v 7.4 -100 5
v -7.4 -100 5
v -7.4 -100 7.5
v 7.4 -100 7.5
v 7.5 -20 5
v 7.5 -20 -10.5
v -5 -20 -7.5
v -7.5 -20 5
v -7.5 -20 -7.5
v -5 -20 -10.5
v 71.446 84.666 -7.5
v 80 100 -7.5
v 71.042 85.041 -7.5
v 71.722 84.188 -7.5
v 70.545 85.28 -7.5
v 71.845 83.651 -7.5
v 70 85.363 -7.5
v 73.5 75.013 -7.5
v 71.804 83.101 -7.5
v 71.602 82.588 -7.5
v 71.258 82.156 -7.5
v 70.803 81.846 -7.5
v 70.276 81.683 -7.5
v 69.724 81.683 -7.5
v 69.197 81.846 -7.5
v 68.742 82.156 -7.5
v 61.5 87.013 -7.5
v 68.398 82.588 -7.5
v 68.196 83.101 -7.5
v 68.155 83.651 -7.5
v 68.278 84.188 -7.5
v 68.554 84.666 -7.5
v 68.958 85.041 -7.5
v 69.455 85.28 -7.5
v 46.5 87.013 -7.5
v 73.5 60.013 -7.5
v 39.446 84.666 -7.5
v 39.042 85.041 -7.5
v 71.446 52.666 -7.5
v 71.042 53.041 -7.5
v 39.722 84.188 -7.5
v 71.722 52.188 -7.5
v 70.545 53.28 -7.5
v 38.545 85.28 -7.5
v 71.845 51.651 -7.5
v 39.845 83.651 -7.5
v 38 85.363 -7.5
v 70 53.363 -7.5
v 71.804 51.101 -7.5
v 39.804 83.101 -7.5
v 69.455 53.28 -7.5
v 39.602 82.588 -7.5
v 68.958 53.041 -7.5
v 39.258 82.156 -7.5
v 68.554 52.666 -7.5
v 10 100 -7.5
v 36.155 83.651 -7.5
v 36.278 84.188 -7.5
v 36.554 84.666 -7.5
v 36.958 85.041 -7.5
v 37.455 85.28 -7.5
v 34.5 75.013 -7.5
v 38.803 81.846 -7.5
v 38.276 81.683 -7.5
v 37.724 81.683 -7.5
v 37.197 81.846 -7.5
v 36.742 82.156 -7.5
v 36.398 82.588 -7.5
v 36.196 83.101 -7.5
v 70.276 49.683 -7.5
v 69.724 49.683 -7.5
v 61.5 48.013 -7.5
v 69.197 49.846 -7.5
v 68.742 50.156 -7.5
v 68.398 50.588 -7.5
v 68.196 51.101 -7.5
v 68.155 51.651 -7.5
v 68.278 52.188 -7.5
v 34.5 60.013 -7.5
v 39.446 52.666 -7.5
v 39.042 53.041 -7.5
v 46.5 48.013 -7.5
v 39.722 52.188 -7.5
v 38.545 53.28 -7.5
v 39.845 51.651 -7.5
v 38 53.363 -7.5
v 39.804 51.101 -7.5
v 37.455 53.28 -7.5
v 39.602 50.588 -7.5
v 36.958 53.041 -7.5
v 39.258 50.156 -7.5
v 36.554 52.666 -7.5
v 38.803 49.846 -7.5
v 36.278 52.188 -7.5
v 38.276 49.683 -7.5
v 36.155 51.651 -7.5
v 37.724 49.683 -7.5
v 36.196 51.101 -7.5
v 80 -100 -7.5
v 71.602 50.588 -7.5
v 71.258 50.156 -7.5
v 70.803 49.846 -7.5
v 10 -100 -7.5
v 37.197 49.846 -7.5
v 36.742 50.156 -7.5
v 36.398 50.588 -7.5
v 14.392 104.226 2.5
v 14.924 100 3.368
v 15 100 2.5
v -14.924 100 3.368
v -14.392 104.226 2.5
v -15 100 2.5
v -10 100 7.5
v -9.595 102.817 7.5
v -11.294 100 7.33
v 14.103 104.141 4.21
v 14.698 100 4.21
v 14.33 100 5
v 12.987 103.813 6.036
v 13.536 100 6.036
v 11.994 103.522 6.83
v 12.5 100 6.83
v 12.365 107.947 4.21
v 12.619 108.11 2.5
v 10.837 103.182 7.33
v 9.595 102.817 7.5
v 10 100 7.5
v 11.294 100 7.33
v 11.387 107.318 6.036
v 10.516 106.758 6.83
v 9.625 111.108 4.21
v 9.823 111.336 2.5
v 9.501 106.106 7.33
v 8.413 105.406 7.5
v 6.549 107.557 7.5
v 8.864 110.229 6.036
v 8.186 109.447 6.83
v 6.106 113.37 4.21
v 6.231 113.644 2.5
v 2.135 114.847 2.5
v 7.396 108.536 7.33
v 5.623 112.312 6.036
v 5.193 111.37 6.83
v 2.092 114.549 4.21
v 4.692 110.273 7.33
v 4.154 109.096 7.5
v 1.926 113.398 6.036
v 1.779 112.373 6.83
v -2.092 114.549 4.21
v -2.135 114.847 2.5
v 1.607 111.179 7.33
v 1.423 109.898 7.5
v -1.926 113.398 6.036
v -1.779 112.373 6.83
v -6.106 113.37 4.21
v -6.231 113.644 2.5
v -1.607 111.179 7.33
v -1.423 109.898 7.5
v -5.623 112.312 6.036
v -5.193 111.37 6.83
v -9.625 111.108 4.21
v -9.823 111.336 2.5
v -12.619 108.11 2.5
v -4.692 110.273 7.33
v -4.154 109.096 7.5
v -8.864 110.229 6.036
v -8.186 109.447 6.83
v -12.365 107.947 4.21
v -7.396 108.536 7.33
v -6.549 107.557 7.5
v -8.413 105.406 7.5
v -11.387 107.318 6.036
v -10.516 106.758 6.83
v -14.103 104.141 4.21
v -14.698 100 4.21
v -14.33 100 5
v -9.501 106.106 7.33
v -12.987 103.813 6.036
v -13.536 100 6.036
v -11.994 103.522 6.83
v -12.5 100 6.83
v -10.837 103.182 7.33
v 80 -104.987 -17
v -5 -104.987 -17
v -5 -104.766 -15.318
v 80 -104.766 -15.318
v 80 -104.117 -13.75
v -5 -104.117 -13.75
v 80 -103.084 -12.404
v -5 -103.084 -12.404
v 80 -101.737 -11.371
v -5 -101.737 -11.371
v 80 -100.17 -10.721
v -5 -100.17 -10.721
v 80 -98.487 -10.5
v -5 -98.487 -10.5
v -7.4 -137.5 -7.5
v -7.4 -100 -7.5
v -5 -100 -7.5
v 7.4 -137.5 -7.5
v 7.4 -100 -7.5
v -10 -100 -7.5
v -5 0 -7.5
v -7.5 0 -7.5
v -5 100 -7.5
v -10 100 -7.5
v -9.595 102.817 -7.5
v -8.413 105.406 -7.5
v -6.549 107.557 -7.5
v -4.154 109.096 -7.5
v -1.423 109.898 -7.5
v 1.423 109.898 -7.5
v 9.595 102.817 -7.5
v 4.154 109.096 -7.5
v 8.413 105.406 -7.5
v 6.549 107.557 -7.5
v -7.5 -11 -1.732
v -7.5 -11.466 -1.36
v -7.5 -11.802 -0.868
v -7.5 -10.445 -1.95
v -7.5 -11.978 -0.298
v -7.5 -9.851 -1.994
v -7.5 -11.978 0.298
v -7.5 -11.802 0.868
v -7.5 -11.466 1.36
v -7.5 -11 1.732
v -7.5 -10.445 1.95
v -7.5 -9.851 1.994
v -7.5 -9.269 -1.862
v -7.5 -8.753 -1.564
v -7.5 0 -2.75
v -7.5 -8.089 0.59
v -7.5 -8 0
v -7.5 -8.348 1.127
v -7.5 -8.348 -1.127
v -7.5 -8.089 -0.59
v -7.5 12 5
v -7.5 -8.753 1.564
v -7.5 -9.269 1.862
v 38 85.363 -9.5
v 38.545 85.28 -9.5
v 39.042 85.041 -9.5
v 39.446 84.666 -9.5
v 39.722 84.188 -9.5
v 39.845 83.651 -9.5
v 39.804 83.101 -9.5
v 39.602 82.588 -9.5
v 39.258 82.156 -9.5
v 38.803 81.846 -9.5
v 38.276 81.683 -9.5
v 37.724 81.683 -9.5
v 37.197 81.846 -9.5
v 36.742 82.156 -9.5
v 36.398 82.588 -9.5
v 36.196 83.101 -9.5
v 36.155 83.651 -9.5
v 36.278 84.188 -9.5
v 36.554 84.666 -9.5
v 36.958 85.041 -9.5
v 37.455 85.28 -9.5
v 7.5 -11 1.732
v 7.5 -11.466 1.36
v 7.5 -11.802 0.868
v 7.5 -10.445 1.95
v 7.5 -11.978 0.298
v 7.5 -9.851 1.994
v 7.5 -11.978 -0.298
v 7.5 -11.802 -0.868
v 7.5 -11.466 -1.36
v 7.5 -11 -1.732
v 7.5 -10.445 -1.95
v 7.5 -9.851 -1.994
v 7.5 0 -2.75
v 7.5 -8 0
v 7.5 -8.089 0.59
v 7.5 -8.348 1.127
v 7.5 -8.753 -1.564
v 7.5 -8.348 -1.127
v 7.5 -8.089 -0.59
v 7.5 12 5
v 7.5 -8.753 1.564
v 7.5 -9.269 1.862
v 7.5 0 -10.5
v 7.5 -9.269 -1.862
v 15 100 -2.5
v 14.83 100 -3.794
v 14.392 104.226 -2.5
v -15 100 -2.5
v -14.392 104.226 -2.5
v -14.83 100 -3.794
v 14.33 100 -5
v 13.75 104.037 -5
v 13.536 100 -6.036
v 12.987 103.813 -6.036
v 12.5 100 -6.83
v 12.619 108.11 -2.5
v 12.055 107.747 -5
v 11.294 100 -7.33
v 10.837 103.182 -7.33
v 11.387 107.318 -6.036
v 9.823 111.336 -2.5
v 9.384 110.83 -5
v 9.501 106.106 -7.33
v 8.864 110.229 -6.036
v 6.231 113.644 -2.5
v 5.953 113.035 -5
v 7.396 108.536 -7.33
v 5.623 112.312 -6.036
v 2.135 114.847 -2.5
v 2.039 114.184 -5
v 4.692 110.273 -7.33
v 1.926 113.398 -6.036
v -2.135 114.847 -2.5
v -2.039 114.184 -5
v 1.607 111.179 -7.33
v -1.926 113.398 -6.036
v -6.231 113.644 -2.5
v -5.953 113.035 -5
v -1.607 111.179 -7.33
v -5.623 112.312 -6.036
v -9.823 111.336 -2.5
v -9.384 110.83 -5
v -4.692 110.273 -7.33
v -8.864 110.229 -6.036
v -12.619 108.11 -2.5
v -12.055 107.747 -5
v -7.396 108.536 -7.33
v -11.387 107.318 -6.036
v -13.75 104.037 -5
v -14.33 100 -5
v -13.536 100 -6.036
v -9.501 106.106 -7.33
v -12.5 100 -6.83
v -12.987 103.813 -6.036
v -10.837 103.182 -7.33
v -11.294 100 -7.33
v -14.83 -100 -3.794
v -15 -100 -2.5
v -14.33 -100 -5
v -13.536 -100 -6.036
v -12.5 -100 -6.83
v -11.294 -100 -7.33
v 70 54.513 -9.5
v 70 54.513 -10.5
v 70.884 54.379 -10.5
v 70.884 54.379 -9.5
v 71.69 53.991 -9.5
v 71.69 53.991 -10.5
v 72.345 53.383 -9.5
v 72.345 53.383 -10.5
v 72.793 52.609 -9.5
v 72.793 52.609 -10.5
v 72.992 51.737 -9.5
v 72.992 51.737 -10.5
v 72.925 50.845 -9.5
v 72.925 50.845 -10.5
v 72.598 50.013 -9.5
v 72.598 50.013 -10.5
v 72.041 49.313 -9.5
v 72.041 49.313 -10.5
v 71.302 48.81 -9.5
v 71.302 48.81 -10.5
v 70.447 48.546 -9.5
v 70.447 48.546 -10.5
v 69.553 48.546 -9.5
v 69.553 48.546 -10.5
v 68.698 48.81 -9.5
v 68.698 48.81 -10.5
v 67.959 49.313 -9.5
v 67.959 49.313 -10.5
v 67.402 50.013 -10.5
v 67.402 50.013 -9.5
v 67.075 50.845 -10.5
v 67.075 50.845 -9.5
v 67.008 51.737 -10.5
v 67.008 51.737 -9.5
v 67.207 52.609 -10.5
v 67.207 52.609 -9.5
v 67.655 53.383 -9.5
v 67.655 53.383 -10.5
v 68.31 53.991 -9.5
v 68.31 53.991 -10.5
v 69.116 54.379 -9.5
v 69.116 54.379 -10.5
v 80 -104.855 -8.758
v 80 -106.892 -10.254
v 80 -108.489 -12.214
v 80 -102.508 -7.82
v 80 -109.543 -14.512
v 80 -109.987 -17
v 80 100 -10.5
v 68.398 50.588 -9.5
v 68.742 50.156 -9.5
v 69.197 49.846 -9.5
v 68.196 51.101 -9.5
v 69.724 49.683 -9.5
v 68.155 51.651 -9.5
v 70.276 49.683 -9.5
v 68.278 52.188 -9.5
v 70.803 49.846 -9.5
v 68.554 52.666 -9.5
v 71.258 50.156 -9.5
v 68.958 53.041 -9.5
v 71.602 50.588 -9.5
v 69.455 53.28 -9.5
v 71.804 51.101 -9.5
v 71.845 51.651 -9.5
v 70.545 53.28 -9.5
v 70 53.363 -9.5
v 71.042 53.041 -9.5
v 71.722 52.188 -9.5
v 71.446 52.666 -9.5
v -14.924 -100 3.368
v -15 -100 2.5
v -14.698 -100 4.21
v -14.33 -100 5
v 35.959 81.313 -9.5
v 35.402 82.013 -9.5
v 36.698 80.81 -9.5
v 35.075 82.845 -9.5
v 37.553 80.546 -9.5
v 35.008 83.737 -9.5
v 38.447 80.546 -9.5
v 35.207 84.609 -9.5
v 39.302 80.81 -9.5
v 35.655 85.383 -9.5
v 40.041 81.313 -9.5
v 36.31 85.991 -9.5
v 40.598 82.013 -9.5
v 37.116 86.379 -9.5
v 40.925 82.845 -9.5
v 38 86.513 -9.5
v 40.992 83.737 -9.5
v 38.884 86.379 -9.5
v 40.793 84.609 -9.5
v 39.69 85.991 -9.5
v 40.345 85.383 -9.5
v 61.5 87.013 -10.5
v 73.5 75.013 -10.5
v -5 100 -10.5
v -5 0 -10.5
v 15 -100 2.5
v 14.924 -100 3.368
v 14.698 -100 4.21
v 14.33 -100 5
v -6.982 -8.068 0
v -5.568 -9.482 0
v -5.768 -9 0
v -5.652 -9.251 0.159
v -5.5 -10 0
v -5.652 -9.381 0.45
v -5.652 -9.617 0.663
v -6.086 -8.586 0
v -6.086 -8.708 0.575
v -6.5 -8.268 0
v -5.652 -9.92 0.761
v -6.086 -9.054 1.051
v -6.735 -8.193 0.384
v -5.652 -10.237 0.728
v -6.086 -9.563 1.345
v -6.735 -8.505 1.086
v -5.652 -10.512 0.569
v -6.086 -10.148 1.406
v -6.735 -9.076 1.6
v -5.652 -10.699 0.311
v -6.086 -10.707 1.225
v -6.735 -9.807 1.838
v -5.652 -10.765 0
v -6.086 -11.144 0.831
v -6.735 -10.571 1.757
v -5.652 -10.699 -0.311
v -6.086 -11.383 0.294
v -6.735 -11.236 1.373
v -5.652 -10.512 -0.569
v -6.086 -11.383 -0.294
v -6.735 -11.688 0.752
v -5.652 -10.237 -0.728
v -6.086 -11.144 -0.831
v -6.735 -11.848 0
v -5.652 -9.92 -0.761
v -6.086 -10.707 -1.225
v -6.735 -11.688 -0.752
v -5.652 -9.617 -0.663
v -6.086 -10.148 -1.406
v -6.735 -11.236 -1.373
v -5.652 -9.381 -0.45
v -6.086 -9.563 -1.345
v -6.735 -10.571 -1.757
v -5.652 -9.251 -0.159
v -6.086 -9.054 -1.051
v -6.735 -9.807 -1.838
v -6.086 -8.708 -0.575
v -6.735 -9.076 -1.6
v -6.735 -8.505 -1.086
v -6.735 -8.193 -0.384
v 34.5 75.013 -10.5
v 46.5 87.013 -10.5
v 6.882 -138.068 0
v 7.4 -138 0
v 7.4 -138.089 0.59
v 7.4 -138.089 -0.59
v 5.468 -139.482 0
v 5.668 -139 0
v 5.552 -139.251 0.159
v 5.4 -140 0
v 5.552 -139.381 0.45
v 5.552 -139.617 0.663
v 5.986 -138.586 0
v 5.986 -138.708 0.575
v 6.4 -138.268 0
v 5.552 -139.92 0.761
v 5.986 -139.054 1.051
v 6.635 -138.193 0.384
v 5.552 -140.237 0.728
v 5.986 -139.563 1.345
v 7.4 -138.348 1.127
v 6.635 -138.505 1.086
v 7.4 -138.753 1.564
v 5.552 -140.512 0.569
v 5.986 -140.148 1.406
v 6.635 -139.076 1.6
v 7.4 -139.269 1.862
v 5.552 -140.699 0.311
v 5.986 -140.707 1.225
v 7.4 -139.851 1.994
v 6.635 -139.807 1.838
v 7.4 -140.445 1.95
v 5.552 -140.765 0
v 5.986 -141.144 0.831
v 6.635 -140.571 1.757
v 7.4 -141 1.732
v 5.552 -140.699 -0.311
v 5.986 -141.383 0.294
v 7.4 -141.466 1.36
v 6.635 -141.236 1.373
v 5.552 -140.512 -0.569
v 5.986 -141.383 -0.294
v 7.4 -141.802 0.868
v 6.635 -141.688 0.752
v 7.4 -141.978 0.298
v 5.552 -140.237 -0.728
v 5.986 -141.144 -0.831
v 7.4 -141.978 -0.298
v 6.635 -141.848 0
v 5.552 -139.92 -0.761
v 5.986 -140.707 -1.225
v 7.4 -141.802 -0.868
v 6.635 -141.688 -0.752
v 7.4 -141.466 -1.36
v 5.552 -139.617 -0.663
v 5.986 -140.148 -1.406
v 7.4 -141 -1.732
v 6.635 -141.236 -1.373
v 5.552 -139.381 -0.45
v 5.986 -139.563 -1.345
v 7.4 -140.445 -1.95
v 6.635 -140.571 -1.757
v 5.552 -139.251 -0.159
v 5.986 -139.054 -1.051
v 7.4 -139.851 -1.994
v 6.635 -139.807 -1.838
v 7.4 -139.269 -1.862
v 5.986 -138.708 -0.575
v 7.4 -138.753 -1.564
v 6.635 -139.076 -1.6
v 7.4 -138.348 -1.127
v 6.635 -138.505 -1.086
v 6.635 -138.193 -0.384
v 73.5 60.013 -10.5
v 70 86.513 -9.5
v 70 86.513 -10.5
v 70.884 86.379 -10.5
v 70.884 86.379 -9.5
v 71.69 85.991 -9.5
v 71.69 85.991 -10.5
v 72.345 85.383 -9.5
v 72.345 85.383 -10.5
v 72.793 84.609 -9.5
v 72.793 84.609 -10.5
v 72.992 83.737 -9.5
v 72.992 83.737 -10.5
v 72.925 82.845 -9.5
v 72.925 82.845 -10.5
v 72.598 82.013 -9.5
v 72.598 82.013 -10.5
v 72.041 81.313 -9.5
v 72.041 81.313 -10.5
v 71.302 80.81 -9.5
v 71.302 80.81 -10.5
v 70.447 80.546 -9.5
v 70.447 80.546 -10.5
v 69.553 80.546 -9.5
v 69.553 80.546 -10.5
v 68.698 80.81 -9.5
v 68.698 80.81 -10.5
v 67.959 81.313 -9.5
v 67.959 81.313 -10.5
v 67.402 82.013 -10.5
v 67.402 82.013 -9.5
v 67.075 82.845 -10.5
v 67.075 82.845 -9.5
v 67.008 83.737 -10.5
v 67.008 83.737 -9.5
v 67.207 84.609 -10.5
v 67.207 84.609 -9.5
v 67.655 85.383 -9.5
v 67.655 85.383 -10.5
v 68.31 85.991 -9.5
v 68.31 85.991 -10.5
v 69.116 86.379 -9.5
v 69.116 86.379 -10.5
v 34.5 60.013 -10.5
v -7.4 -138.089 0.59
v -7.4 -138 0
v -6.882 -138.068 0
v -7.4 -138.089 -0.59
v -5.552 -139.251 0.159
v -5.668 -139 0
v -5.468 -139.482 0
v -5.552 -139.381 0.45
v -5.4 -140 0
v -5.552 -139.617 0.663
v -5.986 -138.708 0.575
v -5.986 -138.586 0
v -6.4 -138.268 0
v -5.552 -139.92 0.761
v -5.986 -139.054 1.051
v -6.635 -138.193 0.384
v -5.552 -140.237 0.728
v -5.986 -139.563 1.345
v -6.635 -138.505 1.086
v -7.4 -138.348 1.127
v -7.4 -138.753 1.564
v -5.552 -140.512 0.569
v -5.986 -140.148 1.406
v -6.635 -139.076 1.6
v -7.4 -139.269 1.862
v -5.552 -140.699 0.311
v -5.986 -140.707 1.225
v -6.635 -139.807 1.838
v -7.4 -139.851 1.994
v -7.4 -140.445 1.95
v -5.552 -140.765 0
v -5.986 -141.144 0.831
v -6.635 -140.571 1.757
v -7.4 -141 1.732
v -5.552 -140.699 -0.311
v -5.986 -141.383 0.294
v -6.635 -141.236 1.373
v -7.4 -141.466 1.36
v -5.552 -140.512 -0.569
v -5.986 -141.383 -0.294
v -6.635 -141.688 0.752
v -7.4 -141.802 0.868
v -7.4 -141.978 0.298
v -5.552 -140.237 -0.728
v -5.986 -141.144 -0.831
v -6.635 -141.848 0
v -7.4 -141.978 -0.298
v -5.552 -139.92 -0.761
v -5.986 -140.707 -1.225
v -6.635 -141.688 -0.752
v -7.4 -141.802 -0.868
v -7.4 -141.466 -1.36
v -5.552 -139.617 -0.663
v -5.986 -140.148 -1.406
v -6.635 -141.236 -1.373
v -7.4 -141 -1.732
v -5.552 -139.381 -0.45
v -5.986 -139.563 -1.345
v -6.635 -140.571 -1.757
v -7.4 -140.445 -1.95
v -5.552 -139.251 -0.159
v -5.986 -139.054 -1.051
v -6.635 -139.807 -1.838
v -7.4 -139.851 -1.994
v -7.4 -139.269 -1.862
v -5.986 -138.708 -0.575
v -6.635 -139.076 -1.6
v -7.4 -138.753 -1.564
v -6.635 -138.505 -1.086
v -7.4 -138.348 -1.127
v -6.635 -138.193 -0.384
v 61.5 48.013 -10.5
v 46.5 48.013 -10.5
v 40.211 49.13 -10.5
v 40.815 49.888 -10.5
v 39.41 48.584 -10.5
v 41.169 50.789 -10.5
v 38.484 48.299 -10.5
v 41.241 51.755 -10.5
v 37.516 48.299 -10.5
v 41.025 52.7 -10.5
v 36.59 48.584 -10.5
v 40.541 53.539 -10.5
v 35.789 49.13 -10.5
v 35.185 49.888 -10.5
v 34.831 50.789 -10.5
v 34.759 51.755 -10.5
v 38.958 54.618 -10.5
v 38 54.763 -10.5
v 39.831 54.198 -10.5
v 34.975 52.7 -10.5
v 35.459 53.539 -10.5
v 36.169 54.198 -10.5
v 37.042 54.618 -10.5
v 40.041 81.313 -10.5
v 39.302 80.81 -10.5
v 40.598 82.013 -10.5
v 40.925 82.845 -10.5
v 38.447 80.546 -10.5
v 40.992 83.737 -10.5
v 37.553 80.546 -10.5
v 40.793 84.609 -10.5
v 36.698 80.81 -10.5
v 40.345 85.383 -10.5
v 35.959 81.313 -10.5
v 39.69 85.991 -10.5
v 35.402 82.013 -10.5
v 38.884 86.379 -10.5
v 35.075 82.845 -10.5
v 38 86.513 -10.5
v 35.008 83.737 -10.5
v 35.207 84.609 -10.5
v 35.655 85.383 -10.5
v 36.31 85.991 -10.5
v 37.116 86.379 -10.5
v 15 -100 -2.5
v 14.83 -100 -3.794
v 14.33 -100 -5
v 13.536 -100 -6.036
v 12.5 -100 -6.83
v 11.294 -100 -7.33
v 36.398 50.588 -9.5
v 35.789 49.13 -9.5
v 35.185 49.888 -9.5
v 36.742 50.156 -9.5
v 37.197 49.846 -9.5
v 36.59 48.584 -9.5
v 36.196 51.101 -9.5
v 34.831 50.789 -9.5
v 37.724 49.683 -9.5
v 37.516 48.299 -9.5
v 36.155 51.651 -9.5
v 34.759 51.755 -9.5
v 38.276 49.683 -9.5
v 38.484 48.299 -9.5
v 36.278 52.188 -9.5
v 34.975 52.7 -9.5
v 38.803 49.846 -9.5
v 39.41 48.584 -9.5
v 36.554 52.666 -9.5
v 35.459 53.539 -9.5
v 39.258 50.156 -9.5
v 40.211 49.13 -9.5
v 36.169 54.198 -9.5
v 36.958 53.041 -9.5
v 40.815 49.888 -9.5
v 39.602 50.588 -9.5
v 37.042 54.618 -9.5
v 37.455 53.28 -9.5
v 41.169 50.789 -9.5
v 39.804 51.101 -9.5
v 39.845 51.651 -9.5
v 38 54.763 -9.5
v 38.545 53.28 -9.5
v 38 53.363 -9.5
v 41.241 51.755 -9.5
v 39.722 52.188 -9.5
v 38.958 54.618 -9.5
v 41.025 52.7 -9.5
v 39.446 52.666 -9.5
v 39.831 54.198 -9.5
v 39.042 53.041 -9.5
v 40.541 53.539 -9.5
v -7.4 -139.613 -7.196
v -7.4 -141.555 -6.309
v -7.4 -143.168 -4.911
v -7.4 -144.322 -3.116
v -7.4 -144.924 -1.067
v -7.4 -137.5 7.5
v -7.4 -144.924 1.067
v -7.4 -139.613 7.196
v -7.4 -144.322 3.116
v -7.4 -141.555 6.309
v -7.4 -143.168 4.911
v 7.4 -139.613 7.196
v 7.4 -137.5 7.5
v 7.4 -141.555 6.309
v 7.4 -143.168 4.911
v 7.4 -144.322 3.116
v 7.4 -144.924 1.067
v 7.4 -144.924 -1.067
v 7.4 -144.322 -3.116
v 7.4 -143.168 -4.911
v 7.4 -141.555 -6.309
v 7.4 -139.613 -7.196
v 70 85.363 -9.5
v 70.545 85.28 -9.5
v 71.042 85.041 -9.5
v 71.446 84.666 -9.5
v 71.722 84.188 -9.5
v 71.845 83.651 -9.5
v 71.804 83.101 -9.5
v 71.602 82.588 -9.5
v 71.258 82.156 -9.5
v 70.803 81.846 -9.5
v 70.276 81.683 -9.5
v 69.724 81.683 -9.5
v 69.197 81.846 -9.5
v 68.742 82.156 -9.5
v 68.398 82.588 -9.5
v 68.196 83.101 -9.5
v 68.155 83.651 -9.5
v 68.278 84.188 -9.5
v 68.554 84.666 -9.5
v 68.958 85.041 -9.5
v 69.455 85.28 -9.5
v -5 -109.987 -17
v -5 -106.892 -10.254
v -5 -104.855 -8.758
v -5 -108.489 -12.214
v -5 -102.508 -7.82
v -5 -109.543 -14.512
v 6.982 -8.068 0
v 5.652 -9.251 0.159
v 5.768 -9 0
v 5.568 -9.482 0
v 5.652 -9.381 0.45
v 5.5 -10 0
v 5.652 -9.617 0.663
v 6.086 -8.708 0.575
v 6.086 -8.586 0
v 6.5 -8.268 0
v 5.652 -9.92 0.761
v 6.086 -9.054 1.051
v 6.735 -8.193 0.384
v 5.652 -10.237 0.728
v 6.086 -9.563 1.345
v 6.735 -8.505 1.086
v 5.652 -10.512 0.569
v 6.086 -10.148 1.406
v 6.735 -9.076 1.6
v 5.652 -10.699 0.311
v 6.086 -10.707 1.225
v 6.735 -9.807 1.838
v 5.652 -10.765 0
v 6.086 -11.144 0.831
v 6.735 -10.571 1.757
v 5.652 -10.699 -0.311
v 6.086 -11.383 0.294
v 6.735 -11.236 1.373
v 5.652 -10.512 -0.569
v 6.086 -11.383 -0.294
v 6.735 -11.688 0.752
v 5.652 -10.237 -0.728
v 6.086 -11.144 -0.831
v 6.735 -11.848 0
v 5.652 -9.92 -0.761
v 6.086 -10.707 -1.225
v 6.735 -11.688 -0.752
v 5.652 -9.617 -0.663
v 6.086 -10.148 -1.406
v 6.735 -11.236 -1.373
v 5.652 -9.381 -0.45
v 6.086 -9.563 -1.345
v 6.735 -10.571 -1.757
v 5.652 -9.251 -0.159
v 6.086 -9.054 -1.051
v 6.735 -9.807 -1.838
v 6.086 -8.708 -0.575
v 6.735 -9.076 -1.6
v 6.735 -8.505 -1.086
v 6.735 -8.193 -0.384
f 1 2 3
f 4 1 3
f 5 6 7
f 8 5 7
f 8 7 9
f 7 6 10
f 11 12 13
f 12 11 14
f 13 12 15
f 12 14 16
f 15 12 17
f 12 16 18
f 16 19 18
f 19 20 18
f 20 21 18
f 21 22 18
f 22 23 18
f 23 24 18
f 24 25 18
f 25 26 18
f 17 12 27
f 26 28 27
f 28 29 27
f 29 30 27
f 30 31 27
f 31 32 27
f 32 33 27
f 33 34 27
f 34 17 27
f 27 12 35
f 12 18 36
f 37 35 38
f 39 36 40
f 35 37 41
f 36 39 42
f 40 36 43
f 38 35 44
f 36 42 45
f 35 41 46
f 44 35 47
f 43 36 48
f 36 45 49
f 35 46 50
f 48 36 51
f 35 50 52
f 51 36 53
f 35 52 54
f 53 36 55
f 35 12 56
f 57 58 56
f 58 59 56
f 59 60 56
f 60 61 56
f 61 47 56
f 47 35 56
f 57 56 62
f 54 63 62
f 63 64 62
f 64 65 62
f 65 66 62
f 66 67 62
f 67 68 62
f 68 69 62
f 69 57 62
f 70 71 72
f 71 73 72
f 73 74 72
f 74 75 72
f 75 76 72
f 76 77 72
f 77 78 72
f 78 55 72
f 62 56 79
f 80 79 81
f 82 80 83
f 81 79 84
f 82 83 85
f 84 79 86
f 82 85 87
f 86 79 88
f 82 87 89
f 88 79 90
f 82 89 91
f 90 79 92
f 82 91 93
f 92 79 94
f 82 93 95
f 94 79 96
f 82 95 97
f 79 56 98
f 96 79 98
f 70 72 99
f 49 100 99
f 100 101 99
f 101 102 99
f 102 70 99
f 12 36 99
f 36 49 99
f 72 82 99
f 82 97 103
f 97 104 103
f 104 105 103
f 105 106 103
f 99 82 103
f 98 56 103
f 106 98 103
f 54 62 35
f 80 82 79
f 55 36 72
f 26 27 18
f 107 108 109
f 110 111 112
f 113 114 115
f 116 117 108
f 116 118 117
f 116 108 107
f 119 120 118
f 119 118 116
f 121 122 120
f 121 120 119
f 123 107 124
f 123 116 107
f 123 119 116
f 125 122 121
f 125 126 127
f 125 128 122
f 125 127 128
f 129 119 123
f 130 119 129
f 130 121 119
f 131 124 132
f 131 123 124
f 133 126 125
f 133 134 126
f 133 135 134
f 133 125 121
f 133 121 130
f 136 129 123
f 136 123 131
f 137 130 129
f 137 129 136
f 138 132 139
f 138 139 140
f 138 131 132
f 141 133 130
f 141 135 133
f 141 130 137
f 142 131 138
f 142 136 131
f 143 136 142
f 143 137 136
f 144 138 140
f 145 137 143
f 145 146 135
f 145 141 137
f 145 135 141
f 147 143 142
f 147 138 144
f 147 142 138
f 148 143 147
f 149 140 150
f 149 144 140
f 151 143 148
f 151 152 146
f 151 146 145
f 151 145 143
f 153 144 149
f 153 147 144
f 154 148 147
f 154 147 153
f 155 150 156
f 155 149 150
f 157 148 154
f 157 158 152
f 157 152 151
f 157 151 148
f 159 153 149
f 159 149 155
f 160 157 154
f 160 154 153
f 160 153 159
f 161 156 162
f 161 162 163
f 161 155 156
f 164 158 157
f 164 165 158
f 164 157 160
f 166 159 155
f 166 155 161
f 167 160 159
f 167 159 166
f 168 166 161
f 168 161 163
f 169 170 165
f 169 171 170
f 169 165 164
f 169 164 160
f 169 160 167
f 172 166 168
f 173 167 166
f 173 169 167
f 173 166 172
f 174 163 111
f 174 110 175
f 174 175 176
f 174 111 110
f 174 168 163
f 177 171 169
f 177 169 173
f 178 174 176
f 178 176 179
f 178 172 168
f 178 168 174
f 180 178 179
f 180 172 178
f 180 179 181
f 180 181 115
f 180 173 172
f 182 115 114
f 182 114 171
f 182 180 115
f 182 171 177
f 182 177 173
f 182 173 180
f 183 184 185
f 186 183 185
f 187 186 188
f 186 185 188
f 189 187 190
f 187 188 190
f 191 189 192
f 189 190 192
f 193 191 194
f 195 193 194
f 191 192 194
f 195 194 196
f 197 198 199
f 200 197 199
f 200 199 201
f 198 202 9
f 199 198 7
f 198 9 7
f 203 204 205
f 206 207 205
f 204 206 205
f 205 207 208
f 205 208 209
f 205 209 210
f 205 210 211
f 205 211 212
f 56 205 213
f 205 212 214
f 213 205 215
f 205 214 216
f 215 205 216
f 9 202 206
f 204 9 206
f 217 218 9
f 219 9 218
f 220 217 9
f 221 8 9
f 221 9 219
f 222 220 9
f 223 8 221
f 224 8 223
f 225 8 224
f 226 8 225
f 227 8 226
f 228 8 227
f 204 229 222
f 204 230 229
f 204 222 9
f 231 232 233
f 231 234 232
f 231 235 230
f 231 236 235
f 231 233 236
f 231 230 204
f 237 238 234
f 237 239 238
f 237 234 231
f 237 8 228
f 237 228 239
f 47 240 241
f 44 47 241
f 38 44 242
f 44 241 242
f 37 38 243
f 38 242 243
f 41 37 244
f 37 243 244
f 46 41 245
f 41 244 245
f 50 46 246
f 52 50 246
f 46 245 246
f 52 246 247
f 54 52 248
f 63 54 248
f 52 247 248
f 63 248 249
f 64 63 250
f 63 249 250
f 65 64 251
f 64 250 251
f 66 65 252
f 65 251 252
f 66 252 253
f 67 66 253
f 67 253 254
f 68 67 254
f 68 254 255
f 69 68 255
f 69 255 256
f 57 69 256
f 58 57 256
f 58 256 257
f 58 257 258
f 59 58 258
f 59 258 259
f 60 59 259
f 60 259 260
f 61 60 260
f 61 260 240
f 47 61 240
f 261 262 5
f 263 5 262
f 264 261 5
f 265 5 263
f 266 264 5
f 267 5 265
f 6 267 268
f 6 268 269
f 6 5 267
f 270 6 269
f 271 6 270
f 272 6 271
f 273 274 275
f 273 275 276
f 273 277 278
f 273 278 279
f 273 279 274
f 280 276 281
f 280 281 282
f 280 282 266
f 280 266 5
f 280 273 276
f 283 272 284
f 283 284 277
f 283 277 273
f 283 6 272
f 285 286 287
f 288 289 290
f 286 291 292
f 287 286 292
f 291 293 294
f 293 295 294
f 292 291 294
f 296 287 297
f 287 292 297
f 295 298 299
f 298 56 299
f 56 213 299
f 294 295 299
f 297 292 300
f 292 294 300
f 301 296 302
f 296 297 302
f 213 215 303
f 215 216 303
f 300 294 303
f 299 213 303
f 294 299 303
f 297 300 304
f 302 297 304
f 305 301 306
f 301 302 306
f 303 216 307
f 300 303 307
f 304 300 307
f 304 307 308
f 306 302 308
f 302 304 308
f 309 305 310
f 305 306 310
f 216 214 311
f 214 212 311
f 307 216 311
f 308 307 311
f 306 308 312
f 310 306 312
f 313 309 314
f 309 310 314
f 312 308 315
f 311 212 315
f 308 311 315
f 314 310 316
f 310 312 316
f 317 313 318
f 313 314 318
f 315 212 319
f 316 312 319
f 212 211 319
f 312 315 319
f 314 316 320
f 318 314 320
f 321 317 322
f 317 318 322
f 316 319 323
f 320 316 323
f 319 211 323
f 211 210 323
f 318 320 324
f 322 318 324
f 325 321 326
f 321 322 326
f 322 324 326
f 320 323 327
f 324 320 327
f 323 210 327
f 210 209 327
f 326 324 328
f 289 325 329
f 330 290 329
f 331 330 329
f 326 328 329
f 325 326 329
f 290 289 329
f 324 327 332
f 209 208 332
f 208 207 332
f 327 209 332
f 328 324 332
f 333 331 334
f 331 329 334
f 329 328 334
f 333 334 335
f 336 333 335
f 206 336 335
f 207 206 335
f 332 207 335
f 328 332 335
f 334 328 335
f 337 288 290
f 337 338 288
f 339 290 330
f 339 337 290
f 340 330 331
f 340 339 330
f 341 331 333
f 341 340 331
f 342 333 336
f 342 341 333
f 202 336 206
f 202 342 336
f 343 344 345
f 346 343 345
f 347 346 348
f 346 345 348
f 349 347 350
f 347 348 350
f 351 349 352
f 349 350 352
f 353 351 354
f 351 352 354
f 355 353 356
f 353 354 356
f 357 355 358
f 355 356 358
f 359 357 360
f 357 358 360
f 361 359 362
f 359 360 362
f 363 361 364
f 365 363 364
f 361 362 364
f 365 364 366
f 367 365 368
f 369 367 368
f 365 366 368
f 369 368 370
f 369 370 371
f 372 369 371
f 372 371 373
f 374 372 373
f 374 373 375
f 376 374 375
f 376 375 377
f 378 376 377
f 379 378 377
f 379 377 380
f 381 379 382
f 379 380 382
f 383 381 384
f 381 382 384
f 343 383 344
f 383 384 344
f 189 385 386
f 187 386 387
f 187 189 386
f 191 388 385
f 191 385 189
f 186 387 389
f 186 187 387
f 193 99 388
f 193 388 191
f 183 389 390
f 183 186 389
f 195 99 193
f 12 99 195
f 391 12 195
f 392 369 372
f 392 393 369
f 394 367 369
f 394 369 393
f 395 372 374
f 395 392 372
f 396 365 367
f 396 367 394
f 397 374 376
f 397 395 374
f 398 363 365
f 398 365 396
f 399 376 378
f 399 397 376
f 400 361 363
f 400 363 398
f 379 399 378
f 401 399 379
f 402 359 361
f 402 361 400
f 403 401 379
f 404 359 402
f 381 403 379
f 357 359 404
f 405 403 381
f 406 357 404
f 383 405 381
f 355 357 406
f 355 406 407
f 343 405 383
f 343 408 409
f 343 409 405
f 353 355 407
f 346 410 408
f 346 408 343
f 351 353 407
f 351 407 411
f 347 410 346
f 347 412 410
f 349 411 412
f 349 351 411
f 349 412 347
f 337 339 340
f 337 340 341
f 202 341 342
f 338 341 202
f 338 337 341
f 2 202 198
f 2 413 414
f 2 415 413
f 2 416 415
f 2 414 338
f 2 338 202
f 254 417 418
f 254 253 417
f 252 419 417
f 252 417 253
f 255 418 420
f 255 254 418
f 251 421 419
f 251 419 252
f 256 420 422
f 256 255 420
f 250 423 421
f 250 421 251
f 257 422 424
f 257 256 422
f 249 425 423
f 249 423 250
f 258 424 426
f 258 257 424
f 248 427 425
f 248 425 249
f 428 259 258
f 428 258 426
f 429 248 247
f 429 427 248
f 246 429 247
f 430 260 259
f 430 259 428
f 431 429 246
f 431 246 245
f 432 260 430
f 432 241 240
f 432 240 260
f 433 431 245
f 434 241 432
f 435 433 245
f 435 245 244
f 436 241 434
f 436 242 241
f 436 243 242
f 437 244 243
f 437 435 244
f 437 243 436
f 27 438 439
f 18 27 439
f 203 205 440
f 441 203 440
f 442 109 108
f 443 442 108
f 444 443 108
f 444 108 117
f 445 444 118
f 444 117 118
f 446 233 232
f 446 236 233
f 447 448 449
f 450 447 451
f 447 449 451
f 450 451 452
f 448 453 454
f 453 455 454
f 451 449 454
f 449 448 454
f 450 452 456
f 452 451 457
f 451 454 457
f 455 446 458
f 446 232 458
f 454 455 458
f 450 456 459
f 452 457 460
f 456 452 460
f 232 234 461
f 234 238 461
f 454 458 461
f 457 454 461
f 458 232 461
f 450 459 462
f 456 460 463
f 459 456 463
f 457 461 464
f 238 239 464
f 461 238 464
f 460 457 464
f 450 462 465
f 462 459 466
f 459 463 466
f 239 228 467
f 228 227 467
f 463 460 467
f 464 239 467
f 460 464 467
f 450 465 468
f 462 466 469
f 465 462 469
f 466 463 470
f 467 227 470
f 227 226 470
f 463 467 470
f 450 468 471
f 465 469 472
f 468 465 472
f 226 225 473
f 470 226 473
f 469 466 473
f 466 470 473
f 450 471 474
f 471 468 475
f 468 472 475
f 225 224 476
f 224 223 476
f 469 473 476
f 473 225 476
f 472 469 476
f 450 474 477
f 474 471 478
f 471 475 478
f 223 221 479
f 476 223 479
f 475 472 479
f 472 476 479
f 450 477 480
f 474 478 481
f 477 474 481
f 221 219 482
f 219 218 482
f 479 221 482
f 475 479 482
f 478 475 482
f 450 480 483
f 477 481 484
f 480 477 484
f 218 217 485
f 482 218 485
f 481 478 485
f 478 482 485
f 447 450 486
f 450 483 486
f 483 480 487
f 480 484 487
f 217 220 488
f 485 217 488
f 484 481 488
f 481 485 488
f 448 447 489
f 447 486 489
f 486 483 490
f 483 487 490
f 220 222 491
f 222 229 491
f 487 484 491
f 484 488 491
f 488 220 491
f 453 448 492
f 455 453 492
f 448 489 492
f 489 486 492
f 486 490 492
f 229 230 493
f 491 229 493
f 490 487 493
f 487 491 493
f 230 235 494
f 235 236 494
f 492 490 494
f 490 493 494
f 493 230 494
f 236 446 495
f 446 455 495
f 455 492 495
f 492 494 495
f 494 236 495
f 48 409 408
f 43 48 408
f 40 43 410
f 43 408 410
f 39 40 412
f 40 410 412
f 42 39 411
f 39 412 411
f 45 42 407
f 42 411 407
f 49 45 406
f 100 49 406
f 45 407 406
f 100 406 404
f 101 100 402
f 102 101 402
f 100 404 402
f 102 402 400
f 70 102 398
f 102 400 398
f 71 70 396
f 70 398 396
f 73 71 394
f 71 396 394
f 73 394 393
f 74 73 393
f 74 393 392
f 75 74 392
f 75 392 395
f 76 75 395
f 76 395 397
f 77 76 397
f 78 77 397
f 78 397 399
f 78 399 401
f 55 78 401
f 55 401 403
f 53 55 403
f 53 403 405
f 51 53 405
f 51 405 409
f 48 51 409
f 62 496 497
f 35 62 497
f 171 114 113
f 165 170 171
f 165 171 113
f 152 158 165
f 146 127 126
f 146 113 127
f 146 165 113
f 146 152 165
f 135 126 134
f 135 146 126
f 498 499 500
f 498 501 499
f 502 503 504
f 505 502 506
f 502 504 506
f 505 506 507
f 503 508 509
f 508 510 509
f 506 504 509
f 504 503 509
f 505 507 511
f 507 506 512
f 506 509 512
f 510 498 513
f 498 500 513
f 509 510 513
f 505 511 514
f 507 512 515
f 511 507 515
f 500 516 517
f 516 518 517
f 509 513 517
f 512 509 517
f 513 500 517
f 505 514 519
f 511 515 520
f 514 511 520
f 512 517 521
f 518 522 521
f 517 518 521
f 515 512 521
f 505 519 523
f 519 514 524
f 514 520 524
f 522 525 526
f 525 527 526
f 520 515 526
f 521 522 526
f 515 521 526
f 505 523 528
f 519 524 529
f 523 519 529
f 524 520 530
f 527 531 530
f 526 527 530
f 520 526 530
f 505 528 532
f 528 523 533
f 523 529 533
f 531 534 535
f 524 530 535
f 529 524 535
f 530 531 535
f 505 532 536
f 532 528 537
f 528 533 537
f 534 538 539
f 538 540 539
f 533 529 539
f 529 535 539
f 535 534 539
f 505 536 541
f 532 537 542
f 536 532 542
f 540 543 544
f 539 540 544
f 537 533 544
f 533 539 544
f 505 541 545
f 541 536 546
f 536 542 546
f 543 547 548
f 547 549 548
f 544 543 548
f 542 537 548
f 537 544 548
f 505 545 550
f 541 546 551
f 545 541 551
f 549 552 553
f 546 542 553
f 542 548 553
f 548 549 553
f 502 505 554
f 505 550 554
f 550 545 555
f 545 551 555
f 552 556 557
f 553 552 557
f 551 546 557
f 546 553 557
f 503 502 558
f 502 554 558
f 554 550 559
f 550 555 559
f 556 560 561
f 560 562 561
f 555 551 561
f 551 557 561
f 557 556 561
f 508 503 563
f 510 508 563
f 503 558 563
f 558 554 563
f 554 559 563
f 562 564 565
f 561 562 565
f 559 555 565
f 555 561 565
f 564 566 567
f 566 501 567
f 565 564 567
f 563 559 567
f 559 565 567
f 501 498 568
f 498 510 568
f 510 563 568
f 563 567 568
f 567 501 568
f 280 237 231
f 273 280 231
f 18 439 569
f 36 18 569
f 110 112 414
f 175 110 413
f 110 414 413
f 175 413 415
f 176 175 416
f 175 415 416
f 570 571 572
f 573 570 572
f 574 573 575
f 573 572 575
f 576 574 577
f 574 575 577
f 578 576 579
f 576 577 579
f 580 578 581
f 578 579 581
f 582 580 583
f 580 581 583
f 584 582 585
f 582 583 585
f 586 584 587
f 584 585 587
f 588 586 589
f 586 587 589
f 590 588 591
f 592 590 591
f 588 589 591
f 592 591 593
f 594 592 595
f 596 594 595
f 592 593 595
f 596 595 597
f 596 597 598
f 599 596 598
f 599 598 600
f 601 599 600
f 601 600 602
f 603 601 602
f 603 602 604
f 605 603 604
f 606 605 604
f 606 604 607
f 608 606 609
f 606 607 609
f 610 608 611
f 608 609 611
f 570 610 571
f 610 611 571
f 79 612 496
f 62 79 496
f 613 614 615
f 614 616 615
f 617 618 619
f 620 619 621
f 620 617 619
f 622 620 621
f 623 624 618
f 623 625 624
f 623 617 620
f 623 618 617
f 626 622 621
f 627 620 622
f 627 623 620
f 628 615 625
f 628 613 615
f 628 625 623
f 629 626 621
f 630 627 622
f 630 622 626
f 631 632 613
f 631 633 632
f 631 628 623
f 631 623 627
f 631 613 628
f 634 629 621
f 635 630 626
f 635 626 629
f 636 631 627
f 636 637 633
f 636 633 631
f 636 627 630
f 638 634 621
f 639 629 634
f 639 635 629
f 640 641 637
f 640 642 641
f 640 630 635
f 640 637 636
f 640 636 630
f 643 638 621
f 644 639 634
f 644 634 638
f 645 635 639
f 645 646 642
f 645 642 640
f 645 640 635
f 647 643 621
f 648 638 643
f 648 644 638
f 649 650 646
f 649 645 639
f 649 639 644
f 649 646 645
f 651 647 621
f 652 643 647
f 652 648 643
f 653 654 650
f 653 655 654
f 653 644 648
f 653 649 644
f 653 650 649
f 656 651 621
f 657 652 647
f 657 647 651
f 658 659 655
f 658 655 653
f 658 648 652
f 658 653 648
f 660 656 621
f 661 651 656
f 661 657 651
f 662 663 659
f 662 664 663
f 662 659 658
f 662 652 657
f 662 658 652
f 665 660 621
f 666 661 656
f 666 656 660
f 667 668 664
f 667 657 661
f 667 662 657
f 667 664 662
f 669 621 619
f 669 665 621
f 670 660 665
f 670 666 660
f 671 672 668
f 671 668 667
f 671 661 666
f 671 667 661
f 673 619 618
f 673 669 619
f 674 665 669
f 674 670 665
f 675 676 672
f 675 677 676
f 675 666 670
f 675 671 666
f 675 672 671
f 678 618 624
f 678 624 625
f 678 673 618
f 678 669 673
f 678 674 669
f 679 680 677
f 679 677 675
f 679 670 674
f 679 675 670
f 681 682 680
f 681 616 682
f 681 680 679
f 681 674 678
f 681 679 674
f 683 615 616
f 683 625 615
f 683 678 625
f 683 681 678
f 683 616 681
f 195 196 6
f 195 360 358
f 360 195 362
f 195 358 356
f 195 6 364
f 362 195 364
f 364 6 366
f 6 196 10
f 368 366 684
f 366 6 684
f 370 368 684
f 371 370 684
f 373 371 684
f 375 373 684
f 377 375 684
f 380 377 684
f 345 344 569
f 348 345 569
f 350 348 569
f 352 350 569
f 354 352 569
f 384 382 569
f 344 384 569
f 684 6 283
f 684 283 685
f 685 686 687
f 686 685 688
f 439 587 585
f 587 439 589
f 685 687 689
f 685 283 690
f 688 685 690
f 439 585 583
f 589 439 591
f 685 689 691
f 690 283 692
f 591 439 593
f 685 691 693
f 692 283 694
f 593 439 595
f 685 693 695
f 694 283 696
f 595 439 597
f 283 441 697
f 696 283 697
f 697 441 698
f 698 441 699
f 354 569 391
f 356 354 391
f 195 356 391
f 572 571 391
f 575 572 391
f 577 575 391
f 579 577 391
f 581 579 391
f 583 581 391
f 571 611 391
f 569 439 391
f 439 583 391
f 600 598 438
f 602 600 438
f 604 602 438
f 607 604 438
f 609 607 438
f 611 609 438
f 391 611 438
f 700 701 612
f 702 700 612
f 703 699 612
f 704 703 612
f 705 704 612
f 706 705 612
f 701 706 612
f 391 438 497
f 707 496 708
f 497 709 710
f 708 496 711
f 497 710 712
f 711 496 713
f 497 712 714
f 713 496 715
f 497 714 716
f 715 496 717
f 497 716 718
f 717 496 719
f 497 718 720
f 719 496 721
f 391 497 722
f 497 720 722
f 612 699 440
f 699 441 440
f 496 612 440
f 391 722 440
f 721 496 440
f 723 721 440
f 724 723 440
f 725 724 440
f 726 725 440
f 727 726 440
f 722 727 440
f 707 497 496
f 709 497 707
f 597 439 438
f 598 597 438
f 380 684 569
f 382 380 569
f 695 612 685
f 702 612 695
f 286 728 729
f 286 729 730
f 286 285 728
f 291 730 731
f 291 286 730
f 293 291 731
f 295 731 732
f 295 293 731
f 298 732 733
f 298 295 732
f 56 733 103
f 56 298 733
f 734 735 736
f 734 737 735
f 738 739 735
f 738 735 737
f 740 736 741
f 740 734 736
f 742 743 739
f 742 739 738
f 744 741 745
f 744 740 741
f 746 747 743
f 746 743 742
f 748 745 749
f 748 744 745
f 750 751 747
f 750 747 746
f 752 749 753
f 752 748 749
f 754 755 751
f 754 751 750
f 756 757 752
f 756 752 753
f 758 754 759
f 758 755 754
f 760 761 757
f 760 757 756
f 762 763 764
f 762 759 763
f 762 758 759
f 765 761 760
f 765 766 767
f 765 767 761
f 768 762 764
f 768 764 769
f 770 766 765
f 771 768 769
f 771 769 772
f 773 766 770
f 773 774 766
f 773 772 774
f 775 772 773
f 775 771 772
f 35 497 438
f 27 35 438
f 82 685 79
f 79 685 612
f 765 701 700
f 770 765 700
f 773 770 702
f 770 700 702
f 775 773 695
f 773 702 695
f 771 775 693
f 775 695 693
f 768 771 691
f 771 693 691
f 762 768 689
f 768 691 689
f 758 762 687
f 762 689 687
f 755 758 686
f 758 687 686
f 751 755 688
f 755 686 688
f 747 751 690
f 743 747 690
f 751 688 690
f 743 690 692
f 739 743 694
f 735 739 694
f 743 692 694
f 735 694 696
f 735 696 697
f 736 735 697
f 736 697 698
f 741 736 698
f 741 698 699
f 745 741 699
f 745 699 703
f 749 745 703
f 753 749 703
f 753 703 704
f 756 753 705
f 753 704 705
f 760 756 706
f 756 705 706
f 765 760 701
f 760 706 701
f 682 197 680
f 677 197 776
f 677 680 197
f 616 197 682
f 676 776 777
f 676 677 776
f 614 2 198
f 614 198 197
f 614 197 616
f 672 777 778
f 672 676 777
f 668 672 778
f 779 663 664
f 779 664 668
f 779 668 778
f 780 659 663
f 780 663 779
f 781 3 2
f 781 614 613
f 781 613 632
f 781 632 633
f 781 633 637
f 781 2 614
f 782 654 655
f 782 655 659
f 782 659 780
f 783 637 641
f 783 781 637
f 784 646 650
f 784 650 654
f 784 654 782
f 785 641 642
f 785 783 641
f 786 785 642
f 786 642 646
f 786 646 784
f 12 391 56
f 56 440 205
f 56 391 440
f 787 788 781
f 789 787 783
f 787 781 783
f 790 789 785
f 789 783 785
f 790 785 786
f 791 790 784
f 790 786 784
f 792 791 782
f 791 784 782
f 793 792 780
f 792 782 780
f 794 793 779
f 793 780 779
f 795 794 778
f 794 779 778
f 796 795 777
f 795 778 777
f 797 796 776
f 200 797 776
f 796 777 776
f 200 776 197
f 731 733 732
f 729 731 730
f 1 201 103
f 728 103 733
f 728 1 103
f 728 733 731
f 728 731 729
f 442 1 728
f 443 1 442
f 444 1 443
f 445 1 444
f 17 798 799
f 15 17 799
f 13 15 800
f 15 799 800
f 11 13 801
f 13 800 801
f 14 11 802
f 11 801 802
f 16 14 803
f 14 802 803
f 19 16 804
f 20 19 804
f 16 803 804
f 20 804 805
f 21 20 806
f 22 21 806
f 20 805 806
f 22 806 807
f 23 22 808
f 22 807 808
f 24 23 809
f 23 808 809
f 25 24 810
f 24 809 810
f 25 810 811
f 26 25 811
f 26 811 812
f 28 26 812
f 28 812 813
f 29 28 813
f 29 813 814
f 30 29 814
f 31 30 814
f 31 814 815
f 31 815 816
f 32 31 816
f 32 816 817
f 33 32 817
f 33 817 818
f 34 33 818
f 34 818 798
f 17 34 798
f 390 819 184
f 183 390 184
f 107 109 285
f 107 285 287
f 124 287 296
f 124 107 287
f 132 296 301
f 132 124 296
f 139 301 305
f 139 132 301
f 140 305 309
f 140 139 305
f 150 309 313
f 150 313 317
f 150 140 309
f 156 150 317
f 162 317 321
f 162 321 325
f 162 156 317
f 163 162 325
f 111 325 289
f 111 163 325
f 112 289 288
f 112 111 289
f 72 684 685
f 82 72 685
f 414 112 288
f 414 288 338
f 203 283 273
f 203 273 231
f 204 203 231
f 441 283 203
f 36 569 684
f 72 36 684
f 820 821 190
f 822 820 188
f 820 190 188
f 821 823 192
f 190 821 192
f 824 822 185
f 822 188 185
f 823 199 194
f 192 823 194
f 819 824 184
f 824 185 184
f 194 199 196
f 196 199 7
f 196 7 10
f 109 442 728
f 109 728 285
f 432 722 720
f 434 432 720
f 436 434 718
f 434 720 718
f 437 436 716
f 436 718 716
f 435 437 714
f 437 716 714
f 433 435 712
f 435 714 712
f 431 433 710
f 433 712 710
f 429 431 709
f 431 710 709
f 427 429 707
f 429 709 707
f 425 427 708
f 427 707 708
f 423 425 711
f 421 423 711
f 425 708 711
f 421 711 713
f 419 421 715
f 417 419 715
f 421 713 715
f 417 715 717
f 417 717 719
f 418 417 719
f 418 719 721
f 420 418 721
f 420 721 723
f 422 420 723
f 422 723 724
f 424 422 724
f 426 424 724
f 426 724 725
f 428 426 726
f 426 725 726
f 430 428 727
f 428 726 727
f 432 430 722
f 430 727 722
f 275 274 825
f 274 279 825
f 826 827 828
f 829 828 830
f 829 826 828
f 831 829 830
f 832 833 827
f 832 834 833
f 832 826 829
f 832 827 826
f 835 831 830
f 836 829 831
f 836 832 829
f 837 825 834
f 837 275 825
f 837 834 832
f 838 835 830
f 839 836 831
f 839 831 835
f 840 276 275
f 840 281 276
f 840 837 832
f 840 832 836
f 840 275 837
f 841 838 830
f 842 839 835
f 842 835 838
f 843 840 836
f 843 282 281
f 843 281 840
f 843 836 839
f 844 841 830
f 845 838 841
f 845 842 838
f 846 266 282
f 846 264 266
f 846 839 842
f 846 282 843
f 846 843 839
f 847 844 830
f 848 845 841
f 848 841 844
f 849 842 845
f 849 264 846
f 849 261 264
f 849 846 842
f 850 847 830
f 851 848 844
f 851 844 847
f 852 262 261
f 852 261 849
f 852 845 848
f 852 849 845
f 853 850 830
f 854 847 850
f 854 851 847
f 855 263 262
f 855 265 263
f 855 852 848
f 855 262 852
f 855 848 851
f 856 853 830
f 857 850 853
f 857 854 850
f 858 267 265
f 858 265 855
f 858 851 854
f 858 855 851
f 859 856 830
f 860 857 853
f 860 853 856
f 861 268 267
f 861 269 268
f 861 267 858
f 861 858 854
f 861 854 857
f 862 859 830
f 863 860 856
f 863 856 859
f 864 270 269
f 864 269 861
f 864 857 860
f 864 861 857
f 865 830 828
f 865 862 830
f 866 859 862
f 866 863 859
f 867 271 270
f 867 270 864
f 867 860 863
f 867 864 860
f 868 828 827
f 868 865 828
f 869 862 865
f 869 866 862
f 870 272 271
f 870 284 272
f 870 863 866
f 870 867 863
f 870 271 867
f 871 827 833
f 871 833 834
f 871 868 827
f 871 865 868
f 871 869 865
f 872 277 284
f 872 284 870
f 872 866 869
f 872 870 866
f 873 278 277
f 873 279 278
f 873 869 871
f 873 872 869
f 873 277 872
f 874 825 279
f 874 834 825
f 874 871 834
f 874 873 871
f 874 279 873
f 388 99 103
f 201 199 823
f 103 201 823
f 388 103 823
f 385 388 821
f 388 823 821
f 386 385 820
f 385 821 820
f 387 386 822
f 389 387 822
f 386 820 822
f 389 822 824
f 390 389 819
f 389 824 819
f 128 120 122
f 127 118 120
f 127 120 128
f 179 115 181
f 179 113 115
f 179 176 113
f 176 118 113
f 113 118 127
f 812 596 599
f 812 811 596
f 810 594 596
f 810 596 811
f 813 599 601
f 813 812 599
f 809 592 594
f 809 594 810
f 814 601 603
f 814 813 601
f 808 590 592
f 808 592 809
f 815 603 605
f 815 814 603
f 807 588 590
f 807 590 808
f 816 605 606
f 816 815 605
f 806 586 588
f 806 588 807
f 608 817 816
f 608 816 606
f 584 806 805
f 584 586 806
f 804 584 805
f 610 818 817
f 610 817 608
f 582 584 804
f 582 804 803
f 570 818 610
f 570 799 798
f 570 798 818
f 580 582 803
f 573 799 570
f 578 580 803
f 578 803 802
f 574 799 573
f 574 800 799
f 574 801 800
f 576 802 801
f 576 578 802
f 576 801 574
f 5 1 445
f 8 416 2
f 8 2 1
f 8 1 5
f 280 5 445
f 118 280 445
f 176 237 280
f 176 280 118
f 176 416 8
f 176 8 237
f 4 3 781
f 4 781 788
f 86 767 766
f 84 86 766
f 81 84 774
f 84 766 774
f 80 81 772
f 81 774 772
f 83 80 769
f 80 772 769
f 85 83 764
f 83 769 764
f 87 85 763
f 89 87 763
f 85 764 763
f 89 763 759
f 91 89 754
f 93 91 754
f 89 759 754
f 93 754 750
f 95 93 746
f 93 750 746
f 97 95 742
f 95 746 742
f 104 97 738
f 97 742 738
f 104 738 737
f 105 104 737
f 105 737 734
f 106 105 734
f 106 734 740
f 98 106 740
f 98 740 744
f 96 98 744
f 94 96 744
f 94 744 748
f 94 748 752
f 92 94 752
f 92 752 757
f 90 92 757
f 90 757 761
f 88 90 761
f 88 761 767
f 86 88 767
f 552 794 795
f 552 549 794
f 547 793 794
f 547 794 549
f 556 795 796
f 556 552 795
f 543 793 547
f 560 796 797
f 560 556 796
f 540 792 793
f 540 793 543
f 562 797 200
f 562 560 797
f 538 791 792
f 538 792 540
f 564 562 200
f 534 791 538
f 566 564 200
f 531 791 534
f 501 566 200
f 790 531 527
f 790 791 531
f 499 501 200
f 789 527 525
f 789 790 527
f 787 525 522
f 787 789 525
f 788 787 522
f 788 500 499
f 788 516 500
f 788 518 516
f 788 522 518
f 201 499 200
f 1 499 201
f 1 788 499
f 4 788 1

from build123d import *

# Parameters (mm, degrees)
BOSS_EXTRUDE1_DEPTH = 7.5
FILLET1_R           = 5
SKETCH4_W           = 15
SKETCH4_H           = 20
CUT_EXTRUDE1_DEPTH  = 152.492574085
CUT_EXTRUDE2_DEPTH  = 152.848641751
BOSS_EXTRUDE2_DEPTH = 80
BOSS_EXTRUDE3_START = 5
BOSS_EXTRUDE3_DEPTH = 5
SKETCH9_W           = 12.5
SKETCH9_H           = 20
CUT_EXTRUDE3_DEPTH  = 3
SKETCH10_W          = 2.5
SKETCH10_H          = 200
CUT_EXTRUDE4_DEPTH  = 175.180940404
SKETCH11_R          = 1.85
CUT_EXTRUDE5_DEPTH  = 167.580310961
SKETCH12_R          = 3
SKETCH12_R_2        = 3.25
CUT_EXTRUDE6_DEPTH  = 1
CUT_EXTRUDE7_DEPTH  = 7.5


with BuildPart() as part:
    # Sketch1 → Boss-Extrude1 (new, symmetric)
    with BuildSketch(Plane.XY):
        with BuildLine():
            Line((-7.4, -150), (7.4, -150))
            Line((7.4, -150), (7.4, -100))
            Line((7.4, -100), (15, -100))
            Line((15, -100), (15, 100))
            ThreePointArc((15, 100), (0, 115), (-15, 100))
            Line((-15, 100), (-15, -100))
            Line((-15, -100), (-7.4, -100))
            Line((-7.4, -100), (-7.4, -150))
        make_face()
    extrude(amount=BOSS_EXTRUDE1_DEPTH, both=True)

    # Fillet1
    fillet1_edges = [part.edges().sort_by_distance(p)[0] for p in [
        (7.4, -150, 0),
        (-7.4, -150, 0),
        (15, 0, 7.5),
        (0, 115, 7.5),
        (-15, 0, 7.5),
        (-15, 0, -7.5),
        (0, 115, -7.5),
        (15, 0, -7.5),
    ]]
    fillet(fillet1_edges, radius=FILLET1_R)

    # Sketch4 → Cut-Extrude1 (cut, through all)
    with BuildSketch(Plane.XY.offset(7.5)):
        with Locations((0, -10)):
            Rectangle(SKETCH4_W, SKETCH4_H)
    extrude(amount=-CUT_EXTRUDE1_DEPTH, mode=Mode.SUBTRACT)

    # Sketch5 → Revolve2 (revolve)
    with BuildSketch(Plane.XY):
        with BuildLine():
            Line((-7.5, -10), (-5.5, -10))
            ThreePointArc((-5.5, -10), (-6.085786438, -8.585786438), (-7.5, -8))
            Line((-7.5, -8), (-7.5, -10))
        make_face()
        with BuildLine():
            Line((7.5, -10), (5.5, -10))
            ThreePointArc((5.5, -10), (6.085786438, -8.585786438), (7.5, -8))
            Line((7.5, -8), (7.5, -10))
        make_face()
    revolve(axis=Axis((-21.965922243, -10, 0), (1, 0, 0)))

    # Sketch2 → Cut-Revolve1 (revolve, cut)
    with BuildSketch(Plane.XY):
        with BuildLine():
            Line((-7.4, -138), (-7.4, -140))
            Line((-7.4, -140), (-5.4, -140))
            ThreePointArc((-5.4, -140), (-5.985786438, -138.585786438), (-7.4, -138))
        make_face()
        with BuildLine():
            Line((7.4, -138), (7.4, -140))
            Line((7.4, -140), (5.4, -140))
            ThreePointArc((5.4, -140), (5.985786438, -138.585786438), (7.4, -138))
        make_face()
    revolve(axis=Axis((-23.291382295, -140, 0), (1, 0, 0)), mode=Mode.SUBTRACT)

    # Sketch6 → Cut-Extrude2 (cut, through all)
    with BuildSketch(Plane.ZY.offset(7.4)):
        with BuildLine():
            Line((-7.5, -137.5), (-7.5, -150))
            Line((-7.5, -150), (7.5, -150))
            Line((7.5, -150), (7.5, -137.5))
            ThreePointArc((7.5, -137.5), (0, -145), (-7.5, -137.5))
        make_face()
    extrude(amount=-CUT_EXTRUDE2_DEPTH, mode=Mode.SUBTRACT)

    # Sketch3 → Boss-Extrude2 (add)
    with BuildSketch(Plane(origin=(0, 0, 0), x_dir=(0, 0, -1), z_dir=(1, 0, 0))):
        with BuildLine():
            Line((17, -109.987492178), (17, -104.987492178))
            ThreePointArc((17, -104.987492178), (12.403805922, -103.083686255), (10.5, -98.487492178))
            Line((10.5, -98.487492178), (10.5, 100))
            Line((10.5, 100), (7.5, 100))
            Line((7.5, 100), (7.5, -100))
            ThreePointArc((7.5, -100), (10.254311627, -106.892024376), (17, -109.987492178))
        make_face()
    extrude(amount=BOSS_EXTRUDE2_DEPTH)

    # Sketch7 → Boss-Extrude3 (add)
    with BuildSketch(Plane.ZY.offset(BOSS_EXTRUDE3_START)):
        with BuildLine():
            Line((-10.5, 100), (-7.5, 100))
            Line((-7.5, 100), (-7.5, 0))
            Line((-7.5, 0), (-7.5, -20))
            Line((-7.5, -20), (-7.5, -100))
            ThreePointArc((-7.5, -100), (-10.254311627, -106.892024376), (-17, -109.987492178))
            Line((-17, -109.987492178), (-17, -104.987492178))
            ThreePointArc((-17, -104.987492178), (-12.403805922, -103.083686255), (-10.5, -98.487492178))
            Line((-10.5, -98.487492178), (-10.5, 100))
        make_face()
    extrude(amount=-BOSS_EXTRUDE3_DEPTH)

    # Sketch9 → Cut-Extrude3 (cut)
    with BuildSketch(Plane(origin=(0, 0, -10.5), x_dir=(-1, 0, 0), z_dir=(0, 0, -1))):
        with Locations((-1.25, -10)):
            Rectangle(SKETCH9_W, SKETCH9_H)
    extrude(amount=-CUT_EXTRUDE3_DEPTH, mode=Mode.SUBTRACT)

    # Sketch10 → Cut-Extrude4 (cut, through all)
    with BuildSketch(Plane.ZY.offset(15)):
        with Locations((6.25, 0)):
            Rectangle(SKETCH10_W, SKETCH10_H)
    extrude(amount=-CUT_EXTRUDE4_DEPTH, mode=Mode.SUBTRACT)

    # Sketch11 → Cut-Extrude5 (cut, through all)
    with BuildSketch(Plane(origin=(0, 0, -10.5), x_dir=(-1, 0, 0), z_dir=(0, 0, -1))):
        with Locations(Location((-38, 83.512507822, 0), (0, 0, 90))):
            Circle(SKETCH11_R)
        with Locations(Location((-38, 51.512507822, 0), (0, 0, 90))):
            Circle(SKETCH11_R)
        with Locations(Location((-70, 83.512507822, 0), (0, 0, 90))):
            Circle(SKETCH11_R)
        with Locations(Location((-70, 51.512507822, 0), (0, 0, 90))):
            Circle(SKETCH11_R)
        Polygon((-46.5, 87.012507822), (-61.5, 87.012507822), (-73.5, 75.012507822), (-73.5, 60.012507822), (-61.5, 48.012507822), (-46.5, 48.012507822), (-34.5, 60.012507822), (-34.5, 75.012507822), align=None)
    extrude(amount=-CUT_EXTRUDE5_DEPTH, mode=Mode.SUBTRACT)

    # Sketch12 → Cut-Extrude6 (cut)
    with BuildSketch(Plane(origin=(0, 0, -10.5), x_dir=(-1, 0, 0), z_dir=(0, 0, -1))):
        with Locations(Location((-38, 83.512507822, 0), (0, 0, 90))):
            Circle(SKETCH12_R)
        with Locations(Location((-70, 83.512507822, 0), (0, 0, 90))):
            Circle(SKETCH12_R)
        with Locations(Location((-70, 51.512507822, 0), (0, 0, 90))):
            Circle(SKETCH12_R)
        with Locations(Location((-38, 51.512507822, 0), (0, 0, 90))):
            Circle(SKETCH12_R_2)
    extrude(amount=-CUT_EXTRUDE6_DEPTH, mode=Mode.SUBTRACT)

    # Sketch13 → Cut-Extrude7 (cut, symmetric)
    with BuildSketch(Plane(origin=(0, 0, 0), x_dir=(0, 0, -1), z_dir=(1, 0, 0))):
        Polygon((2.75, 0), (-5, 0), (-5, 12), align=None)
    extrude(amount=CUT_EXTRUDE7_DEPTH, both=True, mode=Mode.SUBTRACT)


solid = part.part
